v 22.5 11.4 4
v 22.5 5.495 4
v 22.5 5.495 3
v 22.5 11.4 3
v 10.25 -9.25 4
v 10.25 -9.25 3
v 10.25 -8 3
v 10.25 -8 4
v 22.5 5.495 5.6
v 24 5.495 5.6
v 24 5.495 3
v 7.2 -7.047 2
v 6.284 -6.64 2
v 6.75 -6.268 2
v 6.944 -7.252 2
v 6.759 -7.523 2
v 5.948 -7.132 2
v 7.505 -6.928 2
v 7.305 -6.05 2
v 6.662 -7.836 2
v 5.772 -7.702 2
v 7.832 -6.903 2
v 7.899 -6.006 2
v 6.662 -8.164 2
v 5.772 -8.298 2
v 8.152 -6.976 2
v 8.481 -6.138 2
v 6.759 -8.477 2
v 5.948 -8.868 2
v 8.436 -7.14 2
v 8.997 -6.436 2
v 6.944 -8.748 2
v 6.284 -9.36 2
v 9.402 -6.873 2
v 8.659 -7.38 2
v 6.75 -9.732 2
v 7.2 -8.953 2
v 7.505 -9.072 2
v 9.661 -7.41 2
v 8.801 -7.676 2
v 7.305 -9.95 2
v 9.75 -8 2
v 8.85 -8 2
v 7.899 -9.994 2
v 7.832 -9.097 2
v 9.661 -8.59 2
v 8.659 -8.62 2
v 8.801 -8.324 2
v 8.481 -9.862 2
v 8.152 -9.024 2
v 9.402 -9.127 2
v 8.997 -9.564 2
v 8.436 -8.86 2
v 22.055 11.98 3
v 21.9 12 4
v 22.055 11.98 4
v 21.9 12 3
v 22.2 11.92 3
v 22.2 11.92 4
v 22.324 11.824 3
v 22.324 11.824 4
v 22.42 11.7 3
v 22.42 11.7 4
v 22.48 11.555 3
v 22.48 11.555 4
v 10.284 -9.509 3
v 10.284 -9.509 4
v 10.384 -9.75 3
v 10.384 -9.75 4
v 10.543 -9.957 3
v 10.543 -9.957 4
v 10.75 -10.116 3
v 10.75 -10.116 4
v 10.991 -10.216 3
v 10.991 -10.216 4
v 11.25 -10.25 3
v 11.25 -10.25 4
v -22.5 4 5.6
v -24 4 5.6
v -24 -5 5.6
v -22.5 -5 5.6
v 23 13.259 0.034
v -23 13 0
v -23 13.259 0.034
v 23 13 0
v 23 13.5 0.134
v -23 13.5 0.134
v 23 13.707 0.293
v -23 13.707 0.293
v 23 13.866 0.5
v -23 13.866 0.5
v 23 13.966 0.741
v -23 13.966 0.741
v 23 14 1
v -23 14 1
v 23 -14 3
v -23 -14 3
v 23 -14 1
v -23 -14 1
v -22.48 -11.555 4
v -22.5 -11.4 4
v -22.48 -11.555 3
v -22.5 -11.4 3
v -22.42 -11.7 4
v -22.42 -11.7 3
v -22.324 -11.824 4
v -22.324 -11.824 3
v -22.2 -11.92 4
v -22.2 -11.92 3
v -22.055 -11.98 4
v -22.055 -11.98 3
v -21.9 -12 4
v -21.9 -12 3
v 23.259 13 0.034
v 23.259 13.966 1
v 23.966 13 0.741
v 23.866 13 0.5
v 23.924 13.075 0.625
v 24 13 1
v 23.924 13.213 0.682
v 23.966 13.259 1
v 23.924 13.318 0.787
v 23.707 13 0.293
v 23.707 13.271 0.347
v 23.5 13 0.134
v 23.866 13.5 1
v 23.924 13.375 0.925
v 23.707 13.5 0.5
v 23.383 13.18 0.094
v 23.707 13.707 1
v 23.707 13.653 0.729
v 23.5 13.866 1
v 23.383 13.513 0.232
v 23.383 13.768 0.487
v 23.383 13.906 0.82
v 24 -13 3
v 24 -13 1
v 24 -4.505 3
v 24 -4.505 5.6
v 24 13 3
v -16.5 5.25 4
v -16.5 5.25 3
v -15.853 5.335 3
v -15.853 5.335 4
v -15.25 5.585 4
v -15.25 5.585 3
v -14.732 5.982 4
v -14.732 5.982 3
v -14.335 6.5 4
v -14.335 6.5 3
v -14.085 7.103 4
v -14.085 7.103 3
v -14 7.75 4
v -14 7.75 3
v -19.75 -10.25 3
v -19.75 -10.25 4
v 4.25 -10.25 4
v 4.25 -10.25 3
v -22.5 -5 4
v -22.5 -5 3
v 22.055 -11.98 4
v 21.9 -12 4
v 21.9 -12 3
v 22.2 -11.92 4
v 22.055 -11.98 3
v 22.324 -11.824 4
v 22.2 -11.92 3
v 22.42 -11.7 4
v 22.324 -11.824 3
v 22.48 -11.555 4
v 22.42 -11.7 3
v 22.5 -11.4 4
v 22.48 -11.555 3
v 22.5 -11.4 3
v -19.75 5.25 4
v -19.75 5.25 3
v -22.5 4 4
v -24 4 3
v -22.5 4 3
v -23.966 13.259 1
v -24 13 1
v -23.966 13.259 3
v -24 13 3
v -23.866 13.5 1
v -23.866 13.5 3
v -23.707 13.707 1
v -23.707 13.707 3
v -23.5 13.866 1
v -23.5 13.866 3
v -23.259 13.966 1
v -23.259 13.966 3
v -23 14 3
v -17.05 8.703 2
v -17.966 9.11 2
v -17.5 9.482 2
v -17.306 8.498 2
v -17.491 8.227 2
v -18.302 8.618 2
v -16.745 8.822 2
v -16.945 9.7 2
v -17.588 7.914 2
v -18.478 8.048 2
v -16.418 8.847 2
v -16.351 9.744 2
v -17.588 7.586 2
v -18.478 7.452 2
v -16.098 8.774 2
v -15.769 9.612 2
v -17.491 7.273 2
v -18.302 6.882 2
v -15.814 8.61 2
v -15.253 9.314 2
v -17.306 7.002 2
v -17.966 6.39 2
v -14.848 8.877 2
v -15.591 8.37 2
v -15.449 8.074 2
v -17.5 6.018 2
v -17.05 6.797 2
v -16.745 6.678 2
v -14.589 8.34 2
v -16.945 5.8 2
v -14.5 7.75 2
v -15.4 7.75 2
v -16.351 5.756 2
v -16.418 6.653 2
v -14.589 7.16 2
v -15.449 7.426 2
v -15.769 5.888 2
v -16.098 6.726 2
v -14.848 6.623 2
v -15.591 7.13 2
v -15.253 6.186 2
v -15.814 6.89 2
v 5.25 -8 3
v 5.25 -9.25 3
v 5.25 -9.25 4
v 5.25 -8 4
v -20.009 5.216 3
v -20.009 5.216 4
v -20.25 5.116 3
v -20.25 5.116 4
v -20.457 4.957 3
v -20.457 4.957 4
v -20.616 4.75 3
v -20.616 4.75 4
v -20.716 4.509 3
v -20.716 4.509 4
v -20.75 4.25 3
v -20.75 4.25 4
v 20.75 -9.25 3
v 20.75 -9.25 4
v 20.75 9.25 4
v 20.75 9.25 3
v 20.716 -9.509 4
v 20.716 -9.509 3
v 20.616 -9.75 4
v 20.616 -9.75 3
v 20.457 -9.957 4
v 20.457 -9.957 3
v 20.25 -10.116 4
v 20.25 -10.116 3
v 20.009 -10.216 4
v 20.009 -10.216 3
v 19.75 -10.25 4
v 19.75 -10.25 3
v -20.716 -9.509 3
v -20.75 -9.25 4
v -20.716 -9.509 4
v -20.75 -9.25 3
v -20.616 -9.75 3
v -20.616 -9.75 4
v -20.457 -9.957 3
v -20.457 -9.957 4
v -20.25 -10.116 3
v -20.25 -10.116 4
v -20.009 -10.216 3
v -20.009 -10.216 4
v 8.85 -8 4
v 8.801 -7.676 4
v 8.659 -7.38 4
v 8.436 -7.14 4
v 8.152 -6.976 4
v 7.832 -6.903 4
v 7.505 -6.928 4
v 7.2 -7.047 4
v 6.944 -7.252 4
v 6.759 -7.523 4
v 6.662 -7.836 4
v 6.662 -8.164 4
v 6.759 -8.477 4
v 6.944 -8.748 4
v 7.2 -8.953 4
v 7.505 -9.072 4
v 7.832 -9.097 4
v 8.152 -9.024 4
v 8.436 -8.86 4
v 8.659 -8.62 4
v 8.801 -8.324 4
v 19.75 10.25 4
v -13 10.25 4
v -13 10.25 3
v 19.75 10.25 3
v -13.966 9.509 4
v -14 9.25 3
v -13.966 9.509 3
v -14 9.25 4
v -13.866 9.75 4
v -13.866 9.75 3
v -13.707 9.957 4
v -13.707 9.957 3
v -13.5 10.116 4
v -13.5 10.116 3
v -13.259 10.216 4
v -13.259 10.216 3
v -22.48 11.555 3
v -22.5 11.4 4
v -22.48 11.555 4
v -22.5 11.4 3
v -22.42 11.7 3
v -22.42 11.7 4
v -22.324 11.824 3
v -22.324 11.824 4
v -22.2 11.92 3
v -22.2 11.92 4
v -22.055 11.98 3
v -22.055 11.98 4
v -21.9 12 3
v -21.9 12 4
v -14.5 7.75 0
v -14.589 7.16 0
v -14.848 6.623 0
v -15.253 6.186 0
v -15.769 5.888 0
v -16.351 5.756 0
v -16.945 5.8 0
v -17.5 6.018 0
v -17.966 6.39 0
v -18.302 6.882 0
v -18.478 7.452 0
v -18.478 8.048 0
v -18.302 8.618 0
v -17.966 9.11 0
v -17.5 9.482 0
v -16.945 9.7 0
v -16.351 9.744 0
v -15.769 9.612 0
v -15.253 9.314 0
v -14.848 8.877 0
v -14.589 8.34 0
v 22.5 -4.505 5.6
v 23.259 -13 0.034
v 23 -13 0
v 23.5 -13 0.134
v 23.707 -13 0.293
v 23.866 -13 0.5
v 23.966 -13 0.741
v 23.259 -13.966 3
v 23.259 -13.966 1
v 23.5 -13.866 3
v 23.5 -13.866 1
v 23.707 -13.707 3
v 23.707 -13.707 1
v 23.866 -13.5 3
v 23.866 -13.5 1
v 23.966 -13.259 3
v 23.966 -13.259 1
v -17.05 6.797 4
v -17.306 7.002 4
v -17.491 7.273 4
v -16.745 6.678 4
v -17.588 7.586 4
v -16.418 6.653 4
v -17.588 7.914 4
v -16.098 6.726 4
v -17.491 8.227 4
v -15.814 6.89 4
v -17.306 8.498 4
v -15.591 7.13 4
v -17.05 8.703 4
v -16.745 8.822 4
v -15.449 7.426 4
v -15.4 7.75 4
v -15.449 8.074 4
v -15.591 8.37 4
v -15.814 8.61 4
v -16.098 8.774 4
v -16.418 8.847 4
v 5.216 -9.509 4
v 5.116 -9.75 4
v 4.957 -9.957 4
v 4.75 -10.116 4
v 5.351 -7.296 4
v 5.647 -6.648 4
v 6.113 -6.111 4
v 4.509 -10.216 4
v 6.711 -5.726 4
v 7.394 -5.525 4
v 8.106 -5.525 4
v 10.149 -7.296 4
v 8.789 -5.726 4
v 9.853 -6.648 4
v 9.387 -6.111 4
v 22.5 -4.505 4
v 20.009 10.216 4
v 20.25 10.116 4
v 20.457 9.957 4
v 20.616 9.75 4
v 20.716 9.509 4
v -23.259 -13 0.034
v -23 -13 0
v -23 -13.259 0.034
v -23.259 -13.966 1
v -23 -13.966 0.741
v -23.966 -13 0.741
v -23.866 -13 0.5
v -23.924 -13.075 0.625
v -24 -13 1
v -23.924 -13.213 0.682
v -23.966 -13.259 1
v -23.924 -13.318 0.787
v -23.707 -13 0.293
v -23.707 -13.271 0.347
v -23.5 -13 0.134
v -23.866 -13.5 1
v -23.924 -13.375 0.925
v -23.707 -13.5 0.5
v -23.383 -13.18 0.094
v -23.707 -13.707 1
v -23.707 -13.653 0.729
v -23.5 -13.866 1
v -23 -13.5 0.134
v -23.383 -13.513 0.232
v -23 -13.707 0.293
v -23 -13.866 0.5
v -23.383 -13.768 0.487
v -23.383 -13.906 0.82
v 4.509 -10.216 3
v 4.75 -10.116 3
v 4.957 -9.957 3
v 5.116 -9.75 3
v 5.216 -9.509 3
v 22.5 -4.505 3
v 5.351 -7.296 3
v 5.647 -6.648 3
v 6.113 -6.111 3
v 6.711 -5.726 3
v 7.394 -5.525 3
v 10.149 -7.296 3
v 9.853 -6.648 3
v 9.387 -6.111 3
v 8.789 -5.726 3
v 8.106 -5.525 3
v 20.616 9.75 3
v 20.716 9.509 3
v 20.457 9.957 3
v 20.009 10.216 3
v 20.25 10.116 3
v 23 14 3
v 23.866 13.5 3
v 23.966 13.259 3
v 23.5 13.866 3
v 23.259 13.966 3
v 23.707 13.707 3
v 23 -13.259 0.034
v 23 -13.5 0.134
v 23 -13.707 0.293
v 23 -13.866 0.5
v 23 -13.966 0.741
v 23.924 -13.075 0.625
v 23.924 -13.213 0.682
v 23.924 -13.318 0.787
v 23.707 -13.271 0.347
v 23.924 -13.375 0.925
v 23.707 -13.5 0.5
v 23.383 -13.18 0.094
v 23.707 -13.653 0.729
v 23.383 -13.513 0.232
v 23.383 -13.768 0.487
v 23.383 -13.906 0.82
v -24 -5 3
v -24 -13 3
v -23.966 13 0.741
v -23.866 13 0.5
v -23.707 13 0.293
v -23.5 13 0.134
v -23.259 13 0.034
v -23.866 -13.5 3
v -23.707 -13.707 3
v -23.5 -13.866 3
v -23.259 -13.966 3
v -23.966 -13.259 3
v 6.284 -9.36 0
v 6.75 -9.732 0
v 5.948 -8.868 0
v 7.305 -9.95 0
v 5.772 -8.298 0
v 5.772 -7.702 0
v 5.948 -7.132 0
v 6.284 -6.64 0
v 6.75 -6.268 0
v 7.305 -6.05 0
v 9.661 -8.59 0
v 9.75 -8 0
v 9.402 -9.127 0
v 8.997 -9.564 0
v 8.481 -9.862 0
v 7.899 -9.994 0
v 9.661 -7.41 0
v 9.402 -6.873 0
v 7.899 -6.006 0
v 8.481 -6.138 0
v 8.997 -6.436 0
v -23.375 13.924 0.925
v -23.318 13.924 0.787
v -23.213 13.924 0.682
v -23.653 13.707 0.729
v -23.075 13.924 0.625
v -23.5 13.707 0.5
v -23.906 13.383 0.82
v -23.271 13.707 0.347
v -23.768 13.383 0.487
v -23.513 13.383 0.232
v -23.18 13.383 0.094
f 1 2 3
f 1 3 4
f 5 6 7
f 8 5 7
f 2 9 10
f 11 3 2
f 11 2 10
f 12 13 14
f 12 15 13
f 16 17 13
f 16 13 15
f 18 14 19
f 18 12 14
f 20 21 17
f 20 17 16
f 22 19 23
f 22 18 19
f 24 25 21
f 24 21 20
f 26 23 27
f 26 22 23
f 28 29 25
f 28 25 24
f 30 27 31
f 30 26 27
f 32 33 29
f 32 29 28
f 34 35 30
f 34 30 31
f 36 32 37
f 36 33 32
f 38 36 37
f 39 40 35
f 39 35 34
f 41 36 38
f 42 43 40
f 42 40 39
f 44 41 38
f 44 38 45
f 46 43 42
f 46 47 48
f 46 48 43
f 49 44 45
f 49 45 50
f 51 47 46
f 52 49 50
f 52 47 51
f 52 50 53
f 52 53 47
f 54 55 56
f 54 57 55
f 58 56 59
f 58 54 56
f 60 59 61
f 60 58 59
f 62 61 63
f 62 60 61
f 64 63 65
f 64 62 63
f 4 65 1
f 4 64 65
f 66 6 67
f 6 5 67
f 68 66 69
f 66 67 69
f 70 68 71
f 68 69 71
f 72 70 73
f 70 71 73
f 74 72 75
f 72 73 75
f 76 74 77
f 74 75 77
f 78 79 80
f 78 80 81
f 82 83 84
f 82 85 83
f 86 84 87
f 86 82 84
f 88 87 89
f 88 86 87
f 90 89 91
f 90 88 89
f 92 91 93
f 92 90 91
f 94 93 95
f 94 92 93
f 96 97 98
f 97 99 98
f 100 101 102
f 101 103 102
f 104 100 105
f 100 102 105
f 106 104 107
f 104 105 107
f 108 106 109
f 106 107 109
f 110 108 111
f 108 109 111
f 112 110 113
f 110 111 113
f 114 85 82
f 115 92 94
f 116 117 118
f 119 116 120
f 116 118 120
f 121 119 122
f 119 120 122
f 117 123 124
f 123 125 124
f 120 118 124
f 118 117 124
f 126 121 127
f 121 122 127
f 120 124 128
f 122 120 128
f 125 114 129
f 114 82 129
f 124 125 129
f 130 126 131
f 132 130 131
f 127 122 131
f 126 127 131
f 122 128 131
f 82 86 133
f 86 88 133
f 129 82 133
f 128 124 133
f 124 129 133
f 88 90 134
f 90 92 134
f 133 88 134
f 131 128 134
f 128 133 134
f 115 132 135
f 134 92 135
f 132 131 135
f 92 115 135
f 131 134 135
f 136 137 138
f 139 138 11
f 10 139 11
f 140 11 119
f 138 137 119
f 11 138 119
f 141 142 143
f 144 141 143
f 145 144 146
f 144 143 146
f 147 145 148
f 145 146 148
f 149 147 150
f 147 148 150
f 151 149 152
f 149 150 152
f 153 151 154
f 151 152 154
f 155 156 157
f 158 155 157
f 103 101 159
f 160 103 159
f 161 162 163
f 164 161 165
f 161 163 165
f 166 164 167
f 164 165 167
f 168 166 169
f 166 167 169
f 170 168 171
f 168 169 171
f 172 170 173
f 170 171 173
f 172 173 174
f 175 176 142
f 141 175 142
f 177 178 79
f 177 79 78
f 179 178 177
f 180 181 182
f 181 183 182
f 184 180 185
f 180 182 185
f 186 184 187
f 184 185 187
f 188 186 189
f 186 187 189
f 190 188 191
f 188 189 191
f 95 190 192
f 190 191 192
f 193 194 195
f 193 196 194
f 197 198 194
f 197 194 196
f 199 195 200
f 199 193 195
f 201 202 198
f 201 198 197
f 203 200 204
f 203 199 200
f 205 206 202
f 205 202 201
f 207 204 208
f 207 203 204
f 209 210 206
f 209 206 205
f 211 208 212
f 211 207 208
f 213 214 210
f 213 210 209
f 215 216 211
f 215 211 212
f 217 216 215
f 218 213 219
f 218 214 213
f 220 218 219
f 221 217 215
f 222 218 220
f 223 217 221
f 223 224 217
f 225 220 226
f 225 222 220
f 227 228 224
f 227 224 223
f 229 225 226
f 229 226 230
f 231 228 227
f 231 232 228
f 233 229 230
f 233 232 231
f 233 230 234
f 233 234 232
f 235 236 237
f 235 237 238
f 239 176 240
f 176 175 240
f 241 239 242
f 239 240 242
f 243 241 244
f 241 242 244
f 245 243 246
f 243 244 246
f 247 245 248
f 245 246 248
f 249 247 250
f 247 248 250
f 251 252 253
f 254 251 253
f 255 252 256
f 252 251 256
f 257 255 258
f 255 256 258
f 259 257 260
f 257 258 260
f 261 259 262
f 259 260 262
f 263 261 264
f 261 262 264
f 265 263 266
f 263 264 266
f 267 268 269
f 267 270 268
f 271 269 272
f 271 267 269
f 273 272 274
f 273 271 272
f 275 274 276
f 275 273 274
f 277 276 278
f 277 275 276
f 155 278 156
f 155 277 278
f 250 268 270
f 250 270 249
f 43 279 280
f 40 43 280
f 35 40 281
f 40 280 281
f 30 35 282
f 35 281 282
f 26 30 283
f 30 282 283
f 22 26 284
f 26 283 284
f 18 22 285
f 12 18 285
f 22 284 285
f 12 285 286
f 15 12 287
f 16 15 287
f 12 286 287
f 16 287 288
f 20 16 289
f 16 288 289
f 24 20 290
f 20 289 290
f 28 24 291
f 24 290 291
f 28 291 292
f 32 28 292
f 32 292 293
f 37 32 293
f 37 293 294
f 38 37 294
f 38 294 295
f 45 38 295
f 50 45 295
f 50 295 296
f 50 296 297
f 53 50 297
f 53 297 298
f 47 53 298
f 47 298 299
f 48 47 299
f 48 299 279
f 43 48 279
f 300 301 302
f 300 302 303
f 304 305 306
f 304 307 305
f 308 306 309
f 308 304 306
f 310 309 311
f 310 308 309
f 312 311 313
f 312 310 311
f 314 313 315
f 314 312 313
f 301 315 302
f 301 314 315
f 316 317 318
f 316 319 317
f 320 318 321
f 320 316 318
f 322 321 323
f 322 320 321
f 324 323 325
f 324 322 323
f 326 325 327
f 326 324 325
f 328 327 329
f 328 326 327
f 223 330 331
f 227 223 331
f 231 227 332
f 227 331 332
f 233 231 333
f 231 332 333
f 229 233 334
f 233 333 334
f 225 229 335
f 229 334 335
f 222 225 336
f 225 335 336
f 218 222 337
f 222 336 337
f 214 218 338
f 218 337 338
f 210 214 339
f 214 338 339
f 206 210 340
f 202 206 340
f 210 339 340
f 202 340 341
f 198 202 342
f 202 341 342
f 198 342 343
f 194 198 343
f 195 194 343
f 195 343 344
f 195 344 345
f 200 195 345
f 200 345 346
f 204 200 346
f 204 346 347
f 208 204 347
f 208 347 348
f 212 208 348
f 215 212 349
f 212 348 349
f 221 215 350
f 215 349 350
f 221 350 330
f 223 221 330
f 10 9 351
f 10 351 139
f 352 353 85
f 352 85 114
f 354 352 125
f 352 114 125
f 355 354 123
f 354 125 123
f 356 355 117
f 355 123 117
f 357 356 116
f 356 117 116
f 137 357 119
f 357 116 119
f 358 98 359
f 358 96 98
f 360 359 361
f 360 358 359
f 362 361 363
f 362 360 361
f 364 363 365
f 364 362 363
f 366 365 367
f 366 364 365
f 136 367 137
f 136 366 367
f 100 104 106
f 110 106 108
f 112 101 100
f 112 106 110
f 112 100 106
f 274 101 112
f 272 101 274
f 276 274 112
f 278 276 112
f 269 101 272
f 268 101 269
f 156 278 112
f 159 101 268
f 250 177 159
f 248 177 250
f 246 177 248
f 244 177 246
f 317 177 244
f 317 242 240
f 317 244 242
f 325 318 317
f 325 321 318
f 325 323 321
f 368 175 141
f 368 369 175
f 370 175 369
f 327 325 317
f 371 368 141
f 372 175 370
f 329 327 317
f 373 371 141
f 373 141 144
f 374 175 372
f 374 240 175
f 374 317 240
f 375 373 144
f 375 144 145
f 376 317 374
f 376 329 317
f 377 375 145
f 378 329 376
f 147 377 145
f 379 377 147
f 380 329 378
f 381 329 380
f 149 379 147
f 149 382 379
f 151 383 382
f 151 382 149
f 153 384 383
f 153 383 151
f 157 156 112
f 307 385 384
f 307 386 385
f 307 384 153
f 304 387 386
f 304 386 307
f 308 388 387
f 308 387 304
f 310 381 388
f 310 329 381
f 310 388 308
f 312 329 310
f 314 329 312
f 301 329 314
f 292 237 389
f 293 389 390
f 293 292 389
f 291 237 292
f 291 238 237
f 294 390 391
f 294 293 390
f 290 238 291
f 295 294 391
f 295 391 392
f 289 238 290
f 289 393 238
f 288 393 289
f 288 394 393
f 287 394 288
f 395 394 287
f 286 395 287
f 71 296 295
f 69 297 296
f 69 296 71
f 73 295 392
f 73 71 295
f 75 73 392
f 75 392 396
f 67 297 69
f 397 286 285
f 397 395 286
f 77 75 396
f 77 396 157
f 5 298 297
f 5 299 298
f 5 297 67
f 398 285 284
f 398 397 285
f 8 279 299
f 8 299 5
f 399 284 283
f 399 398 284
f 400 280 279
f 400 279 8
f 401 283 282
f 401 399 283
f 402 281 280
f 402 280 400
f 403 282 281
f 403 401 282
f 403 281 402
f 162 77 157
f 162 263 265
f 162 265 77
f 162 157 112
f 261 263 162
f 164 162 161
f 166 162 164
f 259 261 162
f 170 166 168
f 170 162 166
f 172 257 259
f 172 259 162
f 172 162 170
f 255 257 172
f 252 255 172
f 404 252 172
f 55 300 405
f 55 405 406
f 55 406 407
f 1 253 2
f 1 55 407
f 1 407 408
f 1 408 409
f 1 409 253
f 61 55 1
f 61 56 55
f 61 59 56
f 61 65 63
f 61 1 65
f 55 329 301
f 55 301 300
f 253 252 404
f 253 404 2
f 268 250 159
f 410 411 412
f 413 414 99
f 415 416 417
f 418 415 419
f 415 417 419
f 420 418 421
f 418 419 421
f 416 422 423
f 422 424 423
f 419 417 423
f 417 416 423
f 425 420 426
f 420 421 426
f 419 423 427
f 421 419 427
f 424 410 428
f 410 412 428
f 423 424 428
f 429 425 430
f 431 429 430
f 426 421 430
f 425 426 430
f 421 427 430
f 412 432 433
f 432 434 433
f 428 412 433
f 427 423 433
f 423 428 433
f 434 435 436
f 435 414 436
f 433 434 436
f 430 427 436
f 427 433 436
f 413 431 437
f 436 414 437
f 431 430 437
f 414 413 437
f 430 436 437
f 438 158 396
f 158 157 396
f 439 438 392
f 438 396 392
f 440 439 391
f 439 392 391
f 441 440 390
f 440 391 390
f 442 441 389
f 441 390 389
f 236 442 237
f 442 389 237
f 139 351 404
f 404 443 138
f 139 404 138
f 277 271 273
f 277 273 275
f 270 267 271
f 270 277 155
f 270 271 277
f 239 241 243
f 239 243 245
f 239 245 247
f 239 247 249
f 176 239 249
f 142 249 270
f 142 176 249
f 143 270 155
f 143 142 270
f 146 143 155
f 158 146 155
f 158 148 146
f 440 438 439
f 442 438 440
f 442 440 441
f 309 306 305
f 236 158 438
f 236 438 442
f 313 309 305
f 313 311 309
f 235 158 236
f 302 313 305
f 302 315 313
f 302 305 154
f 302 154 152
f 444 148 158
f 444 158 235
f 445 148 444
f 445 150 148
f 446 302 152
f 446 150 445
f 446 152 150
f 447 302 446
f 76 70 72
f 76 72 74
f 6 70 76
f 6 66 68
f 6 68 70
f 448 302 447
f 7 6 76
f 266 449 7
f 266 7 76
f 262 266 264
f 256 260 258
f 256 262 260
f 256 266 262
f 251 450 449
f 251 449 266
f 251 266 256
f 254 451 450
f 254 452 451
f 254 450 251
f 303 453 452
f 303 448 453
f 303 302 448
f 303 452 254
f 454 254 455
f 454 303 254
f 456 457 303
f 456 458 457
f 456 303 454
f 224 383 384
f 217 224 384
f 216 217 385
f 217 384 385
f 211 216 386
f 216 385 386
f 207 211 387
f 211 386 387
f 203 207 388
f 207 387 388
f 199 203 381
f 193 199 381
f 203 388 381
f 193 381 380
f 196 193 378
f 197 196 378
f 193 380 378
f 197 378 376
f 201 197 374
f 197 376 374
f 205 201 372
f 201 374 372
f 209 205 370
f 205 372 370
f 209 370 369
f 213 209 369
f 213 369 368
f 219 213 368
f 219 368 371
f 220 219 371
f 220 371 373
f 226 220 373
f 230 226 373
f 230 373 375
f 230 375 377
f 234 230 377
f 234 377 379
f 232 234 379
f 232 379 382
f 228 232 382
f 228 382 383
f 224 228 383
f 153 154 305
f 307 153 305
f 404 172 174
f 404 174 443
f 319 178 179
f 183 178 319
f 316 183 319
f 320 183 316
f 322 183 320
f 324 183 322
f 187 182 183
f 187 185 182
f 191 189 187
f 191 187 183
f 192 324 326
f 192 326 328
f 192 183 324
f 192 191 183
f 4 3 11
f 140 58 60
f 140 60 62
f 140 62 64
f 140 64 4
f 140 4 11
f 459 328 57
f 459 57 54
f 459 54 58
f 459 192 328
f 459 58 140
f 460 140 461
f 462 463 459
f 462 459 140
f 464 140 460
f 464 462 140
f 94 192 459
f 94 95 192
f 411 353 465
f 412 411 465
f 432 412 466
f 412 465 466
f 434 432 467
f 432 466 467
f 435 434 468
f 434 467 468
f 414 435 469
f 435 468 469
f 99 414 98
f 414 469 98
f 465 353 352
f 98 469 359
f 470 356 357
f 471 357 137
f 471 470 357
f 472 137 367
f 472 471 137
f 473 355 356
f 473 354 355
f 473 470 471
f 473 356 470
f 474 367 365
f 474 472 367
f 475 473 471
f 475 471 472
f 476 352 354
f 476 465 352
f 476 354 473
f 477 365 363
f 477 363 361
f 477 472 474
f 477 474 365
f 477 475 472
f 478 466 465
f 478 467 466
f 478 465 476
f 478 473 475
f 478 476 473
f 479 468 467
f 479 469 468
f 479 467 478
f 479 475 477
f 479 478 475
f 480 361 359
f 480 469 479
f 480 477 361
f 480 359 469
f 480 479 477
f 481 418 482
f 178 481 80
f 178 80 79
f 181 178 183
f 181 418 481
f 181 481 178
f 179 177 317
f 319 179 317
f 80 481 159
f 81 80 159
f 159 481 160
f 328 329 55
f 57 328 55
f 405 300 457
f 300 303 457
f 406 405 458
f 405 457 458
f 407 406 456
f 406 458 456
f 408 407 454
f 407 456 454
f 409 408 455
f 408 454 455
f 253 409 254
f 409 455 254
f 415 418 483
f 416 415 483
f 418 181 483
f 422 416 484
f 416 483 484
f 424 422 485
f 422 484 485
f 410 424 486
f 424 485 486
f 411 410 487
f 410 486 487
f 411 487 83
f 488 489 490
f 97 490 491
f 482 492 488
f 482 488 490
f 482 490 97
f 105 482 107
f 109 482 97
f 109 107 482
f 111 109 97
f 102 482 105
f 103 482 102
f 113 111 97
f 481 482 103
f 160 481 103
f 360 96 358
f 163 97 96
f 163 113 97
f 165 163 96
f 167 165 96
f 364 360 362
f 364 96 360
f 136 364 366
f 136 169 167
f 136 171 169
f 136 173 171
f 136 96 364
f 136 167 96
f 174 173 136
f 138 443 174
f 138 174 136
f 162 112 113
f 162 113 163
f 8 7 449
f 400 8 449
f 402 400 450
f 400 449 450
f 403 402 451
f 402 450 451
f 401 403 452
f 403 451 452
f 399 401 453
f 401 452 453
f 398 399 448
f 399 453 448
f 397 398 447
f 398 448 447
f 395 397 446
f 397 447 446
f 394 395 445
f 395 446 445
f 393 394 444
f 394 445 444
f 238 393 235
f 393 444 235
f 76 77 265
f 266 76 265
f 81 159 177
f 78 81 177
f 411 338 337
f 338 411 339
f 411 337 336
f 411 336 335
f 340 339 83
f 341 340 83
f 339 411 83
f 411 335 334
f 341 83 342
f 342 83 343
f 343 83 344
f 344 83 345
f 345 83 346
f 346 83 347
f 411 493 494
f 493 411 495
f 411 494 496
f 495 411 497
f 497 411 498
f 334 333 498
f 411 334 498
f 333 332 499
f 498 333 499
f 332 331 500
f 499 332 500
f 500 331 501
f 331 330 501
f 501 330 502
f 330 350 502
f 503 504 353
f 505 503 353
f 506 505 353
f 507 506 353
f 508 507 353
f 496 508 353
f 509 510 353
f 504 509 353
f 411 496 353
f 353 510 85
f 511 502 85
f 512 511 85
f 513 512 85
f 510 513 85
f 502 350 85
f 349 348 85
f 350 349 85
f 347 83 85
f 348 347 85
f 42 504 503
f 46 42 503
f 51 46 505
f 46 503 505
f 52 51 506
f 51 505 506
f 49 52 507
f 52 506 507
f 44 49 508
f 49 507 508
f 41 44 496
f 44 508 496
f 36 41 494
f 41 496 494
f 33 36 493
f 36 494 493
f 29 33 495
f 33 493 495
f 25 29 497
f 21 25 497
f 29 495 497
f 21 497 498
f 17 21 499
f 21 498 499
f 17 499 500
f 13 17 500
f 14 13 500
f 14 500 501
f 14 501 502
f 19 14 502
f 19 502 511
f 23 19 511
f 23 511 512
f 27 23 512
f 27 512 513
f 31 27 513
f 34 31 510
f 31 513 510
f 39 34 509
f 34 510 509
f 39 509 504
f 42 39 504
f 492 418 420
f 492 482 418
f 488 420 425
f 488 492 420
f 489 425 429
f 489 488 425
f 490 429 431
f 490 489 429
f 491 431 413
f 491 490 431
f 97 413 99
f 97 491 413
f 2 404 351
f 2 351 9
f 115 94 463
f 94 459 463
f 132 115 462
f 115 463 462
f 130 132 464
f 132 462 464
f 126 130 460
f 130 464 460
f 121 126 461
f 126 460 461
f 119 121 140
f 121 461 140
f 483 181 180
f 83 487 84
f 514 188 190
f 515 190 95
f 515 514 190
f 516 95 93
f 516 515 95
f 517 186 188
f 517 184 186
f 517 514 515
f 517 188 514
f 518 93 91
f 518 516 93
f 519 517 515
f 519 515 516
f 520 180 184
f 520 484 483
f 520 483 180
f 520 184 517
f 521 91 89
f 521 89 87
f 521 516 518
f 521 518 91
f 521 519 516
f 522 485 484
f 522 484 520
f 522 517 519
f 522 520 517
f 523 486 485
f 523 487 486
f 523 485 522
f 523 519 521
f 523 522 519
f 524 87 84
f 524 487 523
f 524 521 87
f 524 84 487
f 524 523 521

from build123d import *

# Parameters (mm, degrees)
SKETCH006_W     = 48
SKETCH006_H     = 28
PAD002_DEPTH    = 4
SKETCH007_W     = 48
SKETCH007_H     = 28
SKETCH007_W_2   = 45
SKETCH007_H_2   = 24
SKETCH007_W_3   = 41.5
SKETCH007_H_3   = 20.5
POCKET004_DEPTH = 1
PAD003_DEPTH    = 1
SKETCH009_R     = 1.1
POCKET005_DEPTH = 4.001
SKETCH010_R     = 2
POCKET006_DEPTH = 2
SKETCH011_W     = 1.5
SKETCH011_H     = 9
SKETCH011_H_2   = 10
PAD004_DEPTH    = 2.6
FILLET002_R     = 1
FILLET003_R     = 1
FILLET004_R     = 0.6


with BuildPart() as part:
    # Sketch006 → Pad002 (new body)
    with BuildSketch(Plane.XY):
        Rectangle(SKETCH006_W, SKETCH006_H)
    extrude(amount=PAD002_DEPTH)

    # Sketch007 (on Face6 of Pad002) → Pocket004 (cut)
    with BuildSketch(Plane.XY.offset(4)):
        Rectangle(SKETCH007_W, SKETCH007_H)
        Rectangle(SKETCH007_W_2, SKETCH007_H_2, mode=Mode.SUBTRACT)
        Rectangle(SKETCH007_W_3, SKETCH007_H_3)
    extrude(amount=-POCKET004_DEPTH, mode=Mode.SUBTRACT)

    # Sketch008 (on Face16 of Pocket004) → Pad003 (join)
    with BuildSketch(Plane.XY.offset(3)):
        with BuildLine():
            Line((5.25, -10.25), (5.25, -8))
            ThreePointArc((10.25, -8), (7.75, -5.5), (5.25, -8))
            Line((10.25, -10.25), (10.25, -8))
            Line((5.25, -10.25), (10.25, -10.25))
        make_face()
        with BuildLine():
            Line((-20.75, 10.25), (-20.75, 5.25))
            Line((-20.75, 5.25), (-16.5, 5.25))
            ThreePointArc((-16.5, 5.25), (-14.732233, 5.982233), (-14, 7.75))
            Line((-14, 7.75), (-14, 10.25))
            Line((-14, 10.25), (-20.75, 10.25))
        make_face()
    extrude(amount=PAD003_DEPTH)

    # Sketch009 (on Face11 of Pad003) → Pocket005 (cut, through all)
    with BuildSketch(Plane.XY.offset(4)):
        with Locations((-16.5, 7.75)):
            Circle(SKETCH009_R)
        with Locations((7.75, -8)):
            Circle(SKETCH009_R)
    extrude(amount=-POCKET005_DEPTH, mode=Mode.SUBTRACT)

    # Sketch010 (on Face2 of Pocket005) → Pocket006 (cut)
    with BuildSketch(Plane(origin=(0, 0, 0), x_dir=(1, 0, 0), z_dir=(0, 0, -1))):
        with Locations((-16.5, -7.75)):
            Circle(SKETCH010_R)
        with Locations((7.75, 8)):
            Circle(SKETCH010_R)
    extrude(amount=-POCKET006_DEPTH, mode=Mode.SUBTRACT)

    # Sketch011 (on Face4 of Pocket006) → Pad004 (join)
    with BuildSketch(Plane.XY.offset(3)):
        with Locations((-23.25, -0.5)):
            Rectangle(SKETCH011_W, SKETCH011_H)
        with Locations((23.25, 0.495)):
            Rectangle(SKETCH011_W, SKETCH011_H_2)
    extrude(amount=PAD004_DEPTH)

    # Fillet002
    fillet002_edges = [part.edges().sort_by_distance(p)[0] for p in [
        (0, -14, 0),
        (-24, 0, 0),
        (-24, -14, 1.5),
        (-24, 14, 1.5),
        (0, 14, 0),
        (24, 0, 0),
        (24, -14, 1.5),
        (24, 14, 1.5),
    ]]
    fillet(fillet002_edges, radius=FILLET002_R)

    # Fillet003
    fillet003_edges = [part.edges().sort_by_distance(p)[0] for p in [
        (5.25, -10.25, 3.5),
        (10.25, -10.25, 3.5),
        (-14, 10.25, 3.5),
        (-20.75, 5.25, 3.5),
        (-20.75, -10.25, 3.5),
        (20.75, 10.25, 3.5),
        (20.75, -10.25, 3.5),
    ]]
    fillet(fillet003_edges, radius=FILLET003_R)

    # Fillet004
    fillet004_edges = [part.edges().sort_by_distance(p)[0] for p in [
        (22.5, 12, 3.5),
        (-22.5, -12, 3.5),
        (-22.5, 12, 3.5),
        (22.5, -12, 3.5),
    ]]
    fillet(fillet004_edges, radius=FILLET004_R)


solid = part.part
